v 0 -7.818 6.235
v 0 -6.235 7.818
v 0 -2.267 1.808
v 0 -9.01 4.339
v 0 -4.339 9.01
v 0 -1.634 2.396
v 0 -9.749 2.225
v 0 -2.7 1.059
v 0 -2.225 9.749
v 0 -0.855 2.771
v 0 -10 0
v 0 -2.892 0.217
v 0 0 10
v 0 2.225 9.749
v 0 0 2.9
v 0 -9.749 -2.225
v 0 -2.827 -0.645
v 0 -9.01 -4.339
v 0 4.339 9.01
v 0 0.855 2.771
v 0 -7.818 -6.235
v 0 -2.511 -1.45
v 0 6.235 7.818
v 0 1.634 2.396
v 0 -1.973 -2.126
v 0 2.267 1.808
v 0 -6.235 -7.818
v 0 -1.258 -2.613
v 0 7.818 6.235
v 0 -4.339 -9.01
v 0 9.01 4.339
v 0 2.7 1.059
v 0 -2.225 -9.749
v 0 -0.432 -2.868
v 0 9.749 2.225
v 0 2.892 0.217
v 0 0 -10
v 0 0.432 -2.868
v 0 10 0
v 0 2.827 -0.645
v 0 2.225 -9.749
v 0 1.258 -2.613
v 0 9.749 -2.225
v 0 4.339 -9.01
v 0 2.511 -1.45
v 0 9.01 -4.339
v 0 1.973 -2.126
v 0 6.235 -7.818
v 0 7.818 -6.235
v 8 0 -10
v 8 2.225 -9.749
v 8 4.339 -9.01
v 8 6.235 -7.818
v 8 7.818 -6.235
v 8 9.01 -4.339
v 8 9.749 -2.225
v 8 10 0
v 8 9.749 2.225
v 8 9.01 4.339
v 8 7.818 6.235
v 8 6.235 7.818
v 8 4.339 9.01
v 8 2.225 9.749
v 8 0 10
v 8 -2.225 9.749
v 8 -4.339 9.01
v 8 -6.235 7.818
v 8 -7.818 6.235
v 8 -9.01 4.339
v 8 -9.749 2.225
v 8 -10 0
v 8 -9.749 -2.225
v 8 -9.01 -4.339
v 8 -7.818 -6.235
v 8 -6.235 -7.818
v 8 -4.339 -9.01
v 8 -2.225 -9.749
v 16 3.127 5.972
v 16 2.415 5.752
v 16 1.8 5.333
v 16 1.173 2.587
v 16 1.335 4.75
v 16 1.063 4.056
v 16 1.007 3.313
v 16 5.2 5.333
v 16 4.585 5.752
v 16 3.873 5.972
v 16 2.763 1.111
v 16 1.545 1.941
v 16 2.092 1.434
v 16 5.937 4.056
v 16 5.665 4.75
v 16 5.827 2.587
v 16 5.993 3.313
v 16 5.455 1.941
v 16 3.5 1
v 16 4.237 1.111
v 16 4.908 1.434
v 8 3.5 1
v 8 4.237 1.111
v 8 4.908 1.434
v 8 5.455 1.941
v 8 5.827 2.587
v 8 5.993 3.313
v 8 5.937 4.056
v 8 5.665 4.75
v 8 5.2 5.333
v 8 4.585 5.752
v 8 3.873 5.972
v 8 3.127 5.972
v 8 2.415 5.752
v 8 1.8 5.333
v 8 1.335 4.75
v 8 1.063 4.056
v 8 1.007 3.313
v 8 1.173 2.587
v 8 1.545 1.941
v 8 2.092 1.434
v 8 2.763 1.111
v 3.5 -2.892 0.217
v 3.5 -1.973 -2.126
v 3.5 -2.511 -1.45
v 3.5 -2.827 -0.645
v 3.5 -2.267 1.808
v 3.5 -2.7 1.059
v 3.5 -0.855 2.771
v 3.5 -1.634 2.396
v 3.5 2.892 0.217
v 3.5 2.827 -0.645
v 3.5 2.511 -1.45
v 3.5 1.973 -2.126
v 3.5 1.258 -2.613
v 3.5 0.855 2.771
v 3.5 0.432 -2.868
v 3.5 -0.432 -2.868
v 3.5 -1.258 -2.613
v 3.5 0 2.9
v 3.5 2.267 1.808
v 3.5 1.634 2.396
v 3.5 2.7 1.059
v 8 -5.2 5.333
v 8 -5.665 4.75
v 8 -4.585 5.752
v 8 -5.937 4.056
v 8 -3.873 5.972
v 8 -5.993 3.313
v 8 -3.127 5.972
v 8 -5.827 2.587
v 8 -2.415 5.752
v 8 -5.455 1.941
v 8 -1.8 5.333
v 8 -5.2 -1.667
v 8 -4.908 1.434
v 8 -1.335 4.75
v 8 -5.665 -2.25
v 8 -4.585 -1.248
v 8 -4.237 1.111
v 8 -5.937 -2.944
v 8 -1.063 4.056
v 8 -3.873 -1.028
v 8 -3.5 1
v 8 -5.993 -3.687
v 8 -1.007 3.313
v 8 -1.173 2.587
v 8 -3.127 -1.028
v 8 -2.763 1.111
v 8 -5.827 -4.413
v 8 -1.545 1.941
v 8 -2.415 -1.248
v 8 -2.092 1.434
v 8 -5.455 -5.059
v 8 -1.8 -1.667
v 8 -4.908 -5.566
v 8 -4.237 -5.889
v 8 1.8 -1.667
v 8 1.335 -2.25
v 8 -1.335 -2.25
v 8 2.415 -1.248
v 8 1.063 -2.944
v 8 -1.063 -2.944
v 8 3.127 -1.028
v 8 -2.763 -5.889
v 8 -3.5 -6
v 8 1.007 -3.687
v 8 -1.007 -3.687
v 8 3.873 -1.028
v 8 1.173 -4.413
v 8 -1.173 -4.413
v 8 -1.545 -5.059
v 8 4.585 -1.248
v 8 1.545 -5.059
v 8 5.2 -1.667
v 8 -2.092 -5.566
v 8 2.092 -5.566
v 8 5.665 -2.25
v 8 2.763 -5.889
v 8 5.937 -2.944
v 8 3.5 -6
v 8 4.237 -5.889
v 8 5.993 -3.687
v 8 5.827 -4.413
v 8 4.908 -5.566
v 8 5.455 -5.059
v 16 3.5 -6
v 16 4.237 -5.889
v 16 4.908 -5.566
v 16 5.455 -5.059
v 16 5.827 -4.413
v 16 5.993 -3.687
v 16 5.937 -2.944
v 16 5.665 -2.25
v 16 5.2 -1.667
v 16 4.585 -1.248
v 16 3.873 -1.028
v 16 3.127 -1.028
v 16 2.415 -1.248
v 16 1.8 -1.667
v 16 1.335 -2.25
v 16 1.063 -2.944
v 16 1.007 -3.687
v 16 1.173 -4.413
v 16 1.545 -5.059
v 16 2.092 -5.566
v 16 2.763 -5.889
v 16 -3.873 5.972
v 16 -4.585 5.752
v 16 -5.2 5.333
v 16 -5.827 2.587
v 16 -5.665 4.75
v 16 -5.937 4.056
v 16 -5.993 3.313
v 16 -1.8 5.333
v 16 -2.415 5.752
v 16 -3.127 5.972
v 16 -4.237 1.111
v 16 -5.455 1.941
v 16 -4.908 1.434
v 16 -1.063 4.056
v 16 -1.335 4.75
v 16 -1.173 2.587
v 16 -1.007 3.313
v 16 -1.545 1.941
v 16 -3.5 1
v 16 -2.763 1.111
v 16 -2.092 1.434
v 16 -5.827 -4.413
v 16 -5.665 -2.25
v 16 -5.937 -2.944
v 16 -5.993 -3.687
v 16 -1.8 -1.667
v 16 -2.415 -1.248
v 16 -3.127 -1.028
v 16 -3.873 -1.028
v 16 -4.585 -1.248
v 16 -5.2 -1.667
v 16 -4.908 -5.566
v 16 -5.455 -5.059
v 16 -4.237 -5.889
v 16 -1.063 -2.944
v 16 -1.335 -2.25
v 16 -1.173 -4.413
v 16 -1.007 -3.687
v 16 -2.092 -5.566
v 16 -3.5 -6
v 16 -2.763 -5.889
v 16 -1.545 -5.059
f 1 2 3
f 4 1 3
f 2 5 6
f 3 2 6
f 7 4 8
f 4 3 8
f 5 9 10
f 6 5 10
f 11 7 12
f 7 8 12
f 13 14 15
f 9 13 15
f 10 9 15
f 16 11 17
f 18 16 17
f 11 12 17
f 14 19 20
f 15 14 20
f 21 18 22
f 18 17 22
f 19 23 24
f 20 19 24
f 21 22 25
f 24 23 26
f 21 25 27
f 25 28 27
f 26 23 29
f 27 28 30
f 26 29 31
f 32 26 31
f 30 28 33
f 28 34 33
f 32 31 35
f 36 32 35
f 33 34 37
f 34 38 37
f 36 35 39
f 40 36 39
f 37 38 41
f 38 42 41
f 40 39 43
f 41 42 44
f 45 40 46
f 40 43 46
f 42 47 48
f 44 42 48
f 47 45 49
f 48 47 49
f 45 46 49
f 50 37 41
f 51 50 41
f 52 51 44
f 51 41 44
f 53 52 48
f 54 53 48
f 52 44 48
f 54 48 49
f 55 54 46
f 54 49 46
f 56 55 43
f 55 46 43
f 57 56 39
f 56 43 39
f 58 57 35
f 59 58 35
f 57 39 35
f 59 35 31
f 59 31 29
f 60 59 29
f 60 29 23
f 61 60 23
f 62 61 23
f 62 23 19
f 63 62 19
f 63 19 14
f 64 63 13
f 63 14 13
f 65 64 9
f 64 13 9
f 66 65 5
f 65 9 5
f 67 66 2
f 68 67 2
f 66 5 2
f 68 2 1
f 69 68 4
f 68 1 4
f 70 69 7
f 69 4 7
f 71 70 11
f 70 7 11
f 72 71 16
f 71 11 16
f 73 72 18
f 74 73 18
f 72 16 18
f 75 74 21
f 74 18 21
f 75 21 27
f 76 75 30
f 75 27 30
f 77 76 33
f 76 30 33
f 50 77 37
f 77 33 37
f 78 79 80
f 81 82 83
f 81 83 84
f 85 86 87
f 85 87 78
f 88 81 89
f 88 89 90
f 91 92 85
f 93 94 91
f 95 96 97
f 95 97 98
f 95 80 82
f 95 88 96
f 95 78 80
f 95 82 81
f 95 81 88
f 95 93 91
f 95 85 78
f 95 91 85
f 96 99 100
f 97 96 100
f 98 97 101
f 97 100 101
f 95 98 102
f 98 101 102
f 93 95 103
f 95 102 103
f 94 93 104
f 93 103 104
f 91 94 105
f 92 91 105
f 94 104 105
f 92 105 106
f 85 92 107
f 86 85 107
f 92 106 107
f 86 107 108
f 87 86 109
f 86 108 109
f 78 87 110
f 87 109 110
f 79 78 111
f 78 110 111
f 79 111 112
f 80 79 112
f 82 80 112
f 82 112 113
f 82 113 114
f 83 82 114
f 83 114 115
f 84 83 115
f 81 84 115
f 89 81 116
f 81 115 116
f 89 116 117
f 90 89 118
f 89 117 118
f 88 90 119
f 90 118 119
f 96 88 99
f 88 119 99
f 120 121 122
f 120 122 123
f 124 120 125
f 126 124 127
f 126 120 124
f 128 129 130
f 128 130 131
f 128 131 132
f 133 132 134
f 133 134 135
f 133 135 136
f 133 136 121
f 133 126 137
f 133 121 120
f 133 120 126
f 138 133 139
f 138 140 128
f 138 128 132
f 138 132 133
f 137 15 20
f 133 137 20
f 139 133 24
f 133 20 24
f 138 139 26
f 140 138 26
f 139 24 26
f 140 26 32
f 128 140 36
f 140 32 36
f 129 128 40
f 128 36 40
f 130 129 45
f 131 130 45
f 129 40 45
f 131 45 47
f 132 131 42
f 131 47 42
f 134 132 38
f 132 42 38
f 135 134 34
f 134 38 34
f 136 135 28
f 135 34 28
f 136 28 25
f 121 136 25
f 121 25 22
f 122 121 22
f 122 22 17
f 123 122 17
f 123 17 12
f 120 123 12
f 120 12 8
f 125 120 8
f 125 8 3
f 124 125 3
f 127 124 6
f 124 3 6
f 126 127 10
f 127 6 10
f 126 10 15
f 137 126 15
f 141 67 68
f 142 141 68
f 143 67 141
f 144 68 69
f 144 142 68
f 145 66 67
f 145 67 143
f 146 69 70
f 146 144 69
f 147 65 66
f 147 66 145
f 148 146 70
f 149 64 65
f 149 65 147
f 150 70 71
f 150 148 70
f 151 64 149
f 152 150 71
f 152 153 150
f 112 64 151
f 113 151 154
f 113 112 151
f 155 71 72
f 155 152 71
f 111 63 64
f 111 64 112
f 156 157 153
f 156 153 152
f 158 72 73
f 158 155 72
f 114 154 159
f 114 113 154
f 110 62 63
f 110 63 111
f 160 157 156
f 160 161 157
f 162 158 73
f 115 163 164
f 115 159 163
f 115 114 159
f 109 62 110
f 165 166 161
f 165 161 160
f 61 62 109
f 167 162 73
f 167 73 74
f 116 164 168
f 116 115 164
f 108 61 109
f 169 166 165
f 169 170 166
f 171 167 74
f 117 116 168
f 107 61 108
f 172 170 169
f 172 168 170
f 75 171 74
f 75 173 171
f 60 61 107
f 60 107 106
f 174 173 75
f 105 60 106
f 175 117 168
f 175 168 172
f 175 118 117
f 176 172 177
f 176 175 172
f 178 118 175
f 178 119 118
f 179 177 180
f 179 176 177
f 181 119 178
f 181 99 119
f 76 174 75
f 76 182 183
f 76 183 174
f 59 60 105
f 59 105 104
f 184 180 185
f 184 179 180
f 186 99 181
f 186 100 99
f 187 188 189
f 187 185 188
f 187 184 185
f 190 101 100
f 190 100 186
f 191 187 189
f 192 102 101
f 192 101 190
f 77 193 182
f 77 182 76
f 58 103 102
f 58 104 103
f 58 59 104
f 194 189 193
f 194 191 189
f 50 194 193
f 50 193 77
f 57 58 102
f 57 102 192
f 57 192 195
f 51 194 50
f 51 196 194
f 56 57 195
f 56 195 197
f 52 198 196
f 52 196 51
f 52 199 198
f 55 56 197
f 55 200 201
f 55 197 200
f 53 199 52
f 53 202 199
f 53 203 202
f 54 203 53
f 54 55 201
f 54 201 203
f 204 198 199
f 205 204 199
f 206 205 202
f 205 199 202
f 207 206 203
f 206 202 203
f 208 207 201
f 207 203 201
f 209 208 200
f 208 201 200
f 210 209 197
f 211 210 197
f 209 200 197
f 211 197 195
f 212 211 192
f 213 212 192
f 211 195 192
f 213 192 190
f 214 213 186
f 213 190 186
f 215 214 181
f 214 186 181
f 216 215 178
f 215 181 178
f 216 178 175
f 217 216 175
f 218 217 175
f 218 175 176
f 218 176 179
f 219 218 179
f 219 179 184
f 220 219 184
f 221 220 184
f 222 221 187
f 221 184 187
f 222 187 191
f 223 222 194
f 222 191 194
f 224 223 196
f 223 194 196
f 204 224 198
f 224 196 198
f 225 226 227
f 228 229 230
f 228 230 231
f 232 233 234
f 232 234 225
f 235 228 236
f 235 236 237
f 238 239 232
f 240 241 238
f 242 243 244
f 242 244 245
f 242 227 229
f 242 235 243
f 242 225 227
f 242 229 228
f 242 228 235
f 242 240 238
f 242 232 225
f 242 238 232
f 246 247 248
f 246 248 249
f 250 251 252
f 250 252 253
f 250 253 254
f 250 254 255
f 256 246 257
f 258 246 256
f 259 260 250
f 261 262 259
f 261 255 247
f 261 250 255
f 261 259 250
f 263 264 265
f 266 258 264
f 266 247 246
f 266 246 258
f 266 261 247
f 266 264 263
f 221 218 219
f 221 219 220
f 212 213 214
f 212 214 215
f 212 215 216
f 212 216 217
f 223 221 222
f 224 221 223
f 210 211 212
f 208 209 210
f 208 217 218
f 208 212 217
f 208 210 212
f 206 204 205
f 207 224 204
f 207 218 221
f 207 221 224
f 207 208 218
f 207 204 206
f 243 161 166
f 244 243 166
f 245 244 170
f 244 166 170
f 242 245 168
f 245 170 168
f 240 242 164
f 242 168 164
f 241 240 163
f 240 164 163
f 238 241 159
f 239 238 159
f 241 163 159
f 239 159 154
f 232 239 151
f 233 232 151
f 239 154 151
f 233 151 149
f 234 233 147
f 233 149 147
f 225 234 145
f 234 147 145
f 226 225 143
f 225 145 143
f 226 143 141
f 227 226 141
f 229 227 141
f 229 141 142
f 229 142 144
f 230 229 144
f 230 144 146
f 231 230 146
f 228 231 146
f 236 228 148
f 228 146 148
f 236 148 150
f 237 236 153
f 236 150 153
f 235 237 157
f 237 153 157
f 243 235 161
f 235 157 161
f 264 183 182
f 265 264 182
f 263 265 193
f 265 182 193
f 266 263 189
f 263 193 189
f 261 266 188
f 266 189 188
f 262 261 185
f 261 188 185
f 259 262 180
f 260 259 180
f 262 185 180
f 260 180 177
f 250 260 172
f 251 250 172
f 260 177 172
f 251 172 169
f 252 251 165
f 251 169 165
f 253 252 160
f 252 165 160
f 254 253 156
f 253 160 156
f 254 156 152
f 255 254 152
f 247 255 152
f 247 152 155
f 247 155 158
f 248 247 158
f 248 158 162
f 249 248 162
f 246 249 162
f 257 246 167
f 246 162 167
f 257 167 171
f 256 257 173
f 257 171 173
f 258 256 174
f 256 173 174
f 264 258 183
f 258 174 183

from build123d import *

# Parameters (mm, degrees)
SKETCH_1_R          = 10
EXTRUDE_1_DEPTH     = 8
SKETCH_2_R          = 2.5
EXTRUDE_2_DEPTH     = 8
SKETCH_3_R          = 2.9
CUT_EXTRUDE_1_DEPTH = 3.5


with BuildPart() as part:
    # Эскиз1 → Бобышка-Вытянуть1 (new body)
    with BuildSketch(Plane(origin=(0, 0, 0), x_dir=(0, 0, -1), z_dir=(1, 0, 0))):
        Circle(SKETCH_1_R)
    extrude(amount=EXTRUDE_1_DEPTH)

    # Эскиз2 → Бобышка-Вытянуть2 (add)
    with BuildSketch(Plane(origin=(8, 0, 0), x_dir=(0, 0, -1), z_dir=(1, 0, 0))):
        with Locations((-3.5, 3.5)):
            Circle(SKETCH_2_R)
        with Locations((3.5, 3.5)):
            Circle(SKETCH_2_R)
        with Locations((-3.5, -3.5)):
            Circle(SKETCH_2_R)
        with Locations((3.5, -3.5)):
            Circle(SKETCH_2_R)
    extrude(amount=EXTRUDE_2_DEPTH)

    # Эскиз3 → Вырез-Вытянуть1 (cut)
    with BuildSketch(Plane.ZY):
        Circle(SKETCH_3_R)
    extrude(amount=-CUT_EXTRUDE_1_DEPTH, mode=Mode.SUBTRACT)


solid = part.part
